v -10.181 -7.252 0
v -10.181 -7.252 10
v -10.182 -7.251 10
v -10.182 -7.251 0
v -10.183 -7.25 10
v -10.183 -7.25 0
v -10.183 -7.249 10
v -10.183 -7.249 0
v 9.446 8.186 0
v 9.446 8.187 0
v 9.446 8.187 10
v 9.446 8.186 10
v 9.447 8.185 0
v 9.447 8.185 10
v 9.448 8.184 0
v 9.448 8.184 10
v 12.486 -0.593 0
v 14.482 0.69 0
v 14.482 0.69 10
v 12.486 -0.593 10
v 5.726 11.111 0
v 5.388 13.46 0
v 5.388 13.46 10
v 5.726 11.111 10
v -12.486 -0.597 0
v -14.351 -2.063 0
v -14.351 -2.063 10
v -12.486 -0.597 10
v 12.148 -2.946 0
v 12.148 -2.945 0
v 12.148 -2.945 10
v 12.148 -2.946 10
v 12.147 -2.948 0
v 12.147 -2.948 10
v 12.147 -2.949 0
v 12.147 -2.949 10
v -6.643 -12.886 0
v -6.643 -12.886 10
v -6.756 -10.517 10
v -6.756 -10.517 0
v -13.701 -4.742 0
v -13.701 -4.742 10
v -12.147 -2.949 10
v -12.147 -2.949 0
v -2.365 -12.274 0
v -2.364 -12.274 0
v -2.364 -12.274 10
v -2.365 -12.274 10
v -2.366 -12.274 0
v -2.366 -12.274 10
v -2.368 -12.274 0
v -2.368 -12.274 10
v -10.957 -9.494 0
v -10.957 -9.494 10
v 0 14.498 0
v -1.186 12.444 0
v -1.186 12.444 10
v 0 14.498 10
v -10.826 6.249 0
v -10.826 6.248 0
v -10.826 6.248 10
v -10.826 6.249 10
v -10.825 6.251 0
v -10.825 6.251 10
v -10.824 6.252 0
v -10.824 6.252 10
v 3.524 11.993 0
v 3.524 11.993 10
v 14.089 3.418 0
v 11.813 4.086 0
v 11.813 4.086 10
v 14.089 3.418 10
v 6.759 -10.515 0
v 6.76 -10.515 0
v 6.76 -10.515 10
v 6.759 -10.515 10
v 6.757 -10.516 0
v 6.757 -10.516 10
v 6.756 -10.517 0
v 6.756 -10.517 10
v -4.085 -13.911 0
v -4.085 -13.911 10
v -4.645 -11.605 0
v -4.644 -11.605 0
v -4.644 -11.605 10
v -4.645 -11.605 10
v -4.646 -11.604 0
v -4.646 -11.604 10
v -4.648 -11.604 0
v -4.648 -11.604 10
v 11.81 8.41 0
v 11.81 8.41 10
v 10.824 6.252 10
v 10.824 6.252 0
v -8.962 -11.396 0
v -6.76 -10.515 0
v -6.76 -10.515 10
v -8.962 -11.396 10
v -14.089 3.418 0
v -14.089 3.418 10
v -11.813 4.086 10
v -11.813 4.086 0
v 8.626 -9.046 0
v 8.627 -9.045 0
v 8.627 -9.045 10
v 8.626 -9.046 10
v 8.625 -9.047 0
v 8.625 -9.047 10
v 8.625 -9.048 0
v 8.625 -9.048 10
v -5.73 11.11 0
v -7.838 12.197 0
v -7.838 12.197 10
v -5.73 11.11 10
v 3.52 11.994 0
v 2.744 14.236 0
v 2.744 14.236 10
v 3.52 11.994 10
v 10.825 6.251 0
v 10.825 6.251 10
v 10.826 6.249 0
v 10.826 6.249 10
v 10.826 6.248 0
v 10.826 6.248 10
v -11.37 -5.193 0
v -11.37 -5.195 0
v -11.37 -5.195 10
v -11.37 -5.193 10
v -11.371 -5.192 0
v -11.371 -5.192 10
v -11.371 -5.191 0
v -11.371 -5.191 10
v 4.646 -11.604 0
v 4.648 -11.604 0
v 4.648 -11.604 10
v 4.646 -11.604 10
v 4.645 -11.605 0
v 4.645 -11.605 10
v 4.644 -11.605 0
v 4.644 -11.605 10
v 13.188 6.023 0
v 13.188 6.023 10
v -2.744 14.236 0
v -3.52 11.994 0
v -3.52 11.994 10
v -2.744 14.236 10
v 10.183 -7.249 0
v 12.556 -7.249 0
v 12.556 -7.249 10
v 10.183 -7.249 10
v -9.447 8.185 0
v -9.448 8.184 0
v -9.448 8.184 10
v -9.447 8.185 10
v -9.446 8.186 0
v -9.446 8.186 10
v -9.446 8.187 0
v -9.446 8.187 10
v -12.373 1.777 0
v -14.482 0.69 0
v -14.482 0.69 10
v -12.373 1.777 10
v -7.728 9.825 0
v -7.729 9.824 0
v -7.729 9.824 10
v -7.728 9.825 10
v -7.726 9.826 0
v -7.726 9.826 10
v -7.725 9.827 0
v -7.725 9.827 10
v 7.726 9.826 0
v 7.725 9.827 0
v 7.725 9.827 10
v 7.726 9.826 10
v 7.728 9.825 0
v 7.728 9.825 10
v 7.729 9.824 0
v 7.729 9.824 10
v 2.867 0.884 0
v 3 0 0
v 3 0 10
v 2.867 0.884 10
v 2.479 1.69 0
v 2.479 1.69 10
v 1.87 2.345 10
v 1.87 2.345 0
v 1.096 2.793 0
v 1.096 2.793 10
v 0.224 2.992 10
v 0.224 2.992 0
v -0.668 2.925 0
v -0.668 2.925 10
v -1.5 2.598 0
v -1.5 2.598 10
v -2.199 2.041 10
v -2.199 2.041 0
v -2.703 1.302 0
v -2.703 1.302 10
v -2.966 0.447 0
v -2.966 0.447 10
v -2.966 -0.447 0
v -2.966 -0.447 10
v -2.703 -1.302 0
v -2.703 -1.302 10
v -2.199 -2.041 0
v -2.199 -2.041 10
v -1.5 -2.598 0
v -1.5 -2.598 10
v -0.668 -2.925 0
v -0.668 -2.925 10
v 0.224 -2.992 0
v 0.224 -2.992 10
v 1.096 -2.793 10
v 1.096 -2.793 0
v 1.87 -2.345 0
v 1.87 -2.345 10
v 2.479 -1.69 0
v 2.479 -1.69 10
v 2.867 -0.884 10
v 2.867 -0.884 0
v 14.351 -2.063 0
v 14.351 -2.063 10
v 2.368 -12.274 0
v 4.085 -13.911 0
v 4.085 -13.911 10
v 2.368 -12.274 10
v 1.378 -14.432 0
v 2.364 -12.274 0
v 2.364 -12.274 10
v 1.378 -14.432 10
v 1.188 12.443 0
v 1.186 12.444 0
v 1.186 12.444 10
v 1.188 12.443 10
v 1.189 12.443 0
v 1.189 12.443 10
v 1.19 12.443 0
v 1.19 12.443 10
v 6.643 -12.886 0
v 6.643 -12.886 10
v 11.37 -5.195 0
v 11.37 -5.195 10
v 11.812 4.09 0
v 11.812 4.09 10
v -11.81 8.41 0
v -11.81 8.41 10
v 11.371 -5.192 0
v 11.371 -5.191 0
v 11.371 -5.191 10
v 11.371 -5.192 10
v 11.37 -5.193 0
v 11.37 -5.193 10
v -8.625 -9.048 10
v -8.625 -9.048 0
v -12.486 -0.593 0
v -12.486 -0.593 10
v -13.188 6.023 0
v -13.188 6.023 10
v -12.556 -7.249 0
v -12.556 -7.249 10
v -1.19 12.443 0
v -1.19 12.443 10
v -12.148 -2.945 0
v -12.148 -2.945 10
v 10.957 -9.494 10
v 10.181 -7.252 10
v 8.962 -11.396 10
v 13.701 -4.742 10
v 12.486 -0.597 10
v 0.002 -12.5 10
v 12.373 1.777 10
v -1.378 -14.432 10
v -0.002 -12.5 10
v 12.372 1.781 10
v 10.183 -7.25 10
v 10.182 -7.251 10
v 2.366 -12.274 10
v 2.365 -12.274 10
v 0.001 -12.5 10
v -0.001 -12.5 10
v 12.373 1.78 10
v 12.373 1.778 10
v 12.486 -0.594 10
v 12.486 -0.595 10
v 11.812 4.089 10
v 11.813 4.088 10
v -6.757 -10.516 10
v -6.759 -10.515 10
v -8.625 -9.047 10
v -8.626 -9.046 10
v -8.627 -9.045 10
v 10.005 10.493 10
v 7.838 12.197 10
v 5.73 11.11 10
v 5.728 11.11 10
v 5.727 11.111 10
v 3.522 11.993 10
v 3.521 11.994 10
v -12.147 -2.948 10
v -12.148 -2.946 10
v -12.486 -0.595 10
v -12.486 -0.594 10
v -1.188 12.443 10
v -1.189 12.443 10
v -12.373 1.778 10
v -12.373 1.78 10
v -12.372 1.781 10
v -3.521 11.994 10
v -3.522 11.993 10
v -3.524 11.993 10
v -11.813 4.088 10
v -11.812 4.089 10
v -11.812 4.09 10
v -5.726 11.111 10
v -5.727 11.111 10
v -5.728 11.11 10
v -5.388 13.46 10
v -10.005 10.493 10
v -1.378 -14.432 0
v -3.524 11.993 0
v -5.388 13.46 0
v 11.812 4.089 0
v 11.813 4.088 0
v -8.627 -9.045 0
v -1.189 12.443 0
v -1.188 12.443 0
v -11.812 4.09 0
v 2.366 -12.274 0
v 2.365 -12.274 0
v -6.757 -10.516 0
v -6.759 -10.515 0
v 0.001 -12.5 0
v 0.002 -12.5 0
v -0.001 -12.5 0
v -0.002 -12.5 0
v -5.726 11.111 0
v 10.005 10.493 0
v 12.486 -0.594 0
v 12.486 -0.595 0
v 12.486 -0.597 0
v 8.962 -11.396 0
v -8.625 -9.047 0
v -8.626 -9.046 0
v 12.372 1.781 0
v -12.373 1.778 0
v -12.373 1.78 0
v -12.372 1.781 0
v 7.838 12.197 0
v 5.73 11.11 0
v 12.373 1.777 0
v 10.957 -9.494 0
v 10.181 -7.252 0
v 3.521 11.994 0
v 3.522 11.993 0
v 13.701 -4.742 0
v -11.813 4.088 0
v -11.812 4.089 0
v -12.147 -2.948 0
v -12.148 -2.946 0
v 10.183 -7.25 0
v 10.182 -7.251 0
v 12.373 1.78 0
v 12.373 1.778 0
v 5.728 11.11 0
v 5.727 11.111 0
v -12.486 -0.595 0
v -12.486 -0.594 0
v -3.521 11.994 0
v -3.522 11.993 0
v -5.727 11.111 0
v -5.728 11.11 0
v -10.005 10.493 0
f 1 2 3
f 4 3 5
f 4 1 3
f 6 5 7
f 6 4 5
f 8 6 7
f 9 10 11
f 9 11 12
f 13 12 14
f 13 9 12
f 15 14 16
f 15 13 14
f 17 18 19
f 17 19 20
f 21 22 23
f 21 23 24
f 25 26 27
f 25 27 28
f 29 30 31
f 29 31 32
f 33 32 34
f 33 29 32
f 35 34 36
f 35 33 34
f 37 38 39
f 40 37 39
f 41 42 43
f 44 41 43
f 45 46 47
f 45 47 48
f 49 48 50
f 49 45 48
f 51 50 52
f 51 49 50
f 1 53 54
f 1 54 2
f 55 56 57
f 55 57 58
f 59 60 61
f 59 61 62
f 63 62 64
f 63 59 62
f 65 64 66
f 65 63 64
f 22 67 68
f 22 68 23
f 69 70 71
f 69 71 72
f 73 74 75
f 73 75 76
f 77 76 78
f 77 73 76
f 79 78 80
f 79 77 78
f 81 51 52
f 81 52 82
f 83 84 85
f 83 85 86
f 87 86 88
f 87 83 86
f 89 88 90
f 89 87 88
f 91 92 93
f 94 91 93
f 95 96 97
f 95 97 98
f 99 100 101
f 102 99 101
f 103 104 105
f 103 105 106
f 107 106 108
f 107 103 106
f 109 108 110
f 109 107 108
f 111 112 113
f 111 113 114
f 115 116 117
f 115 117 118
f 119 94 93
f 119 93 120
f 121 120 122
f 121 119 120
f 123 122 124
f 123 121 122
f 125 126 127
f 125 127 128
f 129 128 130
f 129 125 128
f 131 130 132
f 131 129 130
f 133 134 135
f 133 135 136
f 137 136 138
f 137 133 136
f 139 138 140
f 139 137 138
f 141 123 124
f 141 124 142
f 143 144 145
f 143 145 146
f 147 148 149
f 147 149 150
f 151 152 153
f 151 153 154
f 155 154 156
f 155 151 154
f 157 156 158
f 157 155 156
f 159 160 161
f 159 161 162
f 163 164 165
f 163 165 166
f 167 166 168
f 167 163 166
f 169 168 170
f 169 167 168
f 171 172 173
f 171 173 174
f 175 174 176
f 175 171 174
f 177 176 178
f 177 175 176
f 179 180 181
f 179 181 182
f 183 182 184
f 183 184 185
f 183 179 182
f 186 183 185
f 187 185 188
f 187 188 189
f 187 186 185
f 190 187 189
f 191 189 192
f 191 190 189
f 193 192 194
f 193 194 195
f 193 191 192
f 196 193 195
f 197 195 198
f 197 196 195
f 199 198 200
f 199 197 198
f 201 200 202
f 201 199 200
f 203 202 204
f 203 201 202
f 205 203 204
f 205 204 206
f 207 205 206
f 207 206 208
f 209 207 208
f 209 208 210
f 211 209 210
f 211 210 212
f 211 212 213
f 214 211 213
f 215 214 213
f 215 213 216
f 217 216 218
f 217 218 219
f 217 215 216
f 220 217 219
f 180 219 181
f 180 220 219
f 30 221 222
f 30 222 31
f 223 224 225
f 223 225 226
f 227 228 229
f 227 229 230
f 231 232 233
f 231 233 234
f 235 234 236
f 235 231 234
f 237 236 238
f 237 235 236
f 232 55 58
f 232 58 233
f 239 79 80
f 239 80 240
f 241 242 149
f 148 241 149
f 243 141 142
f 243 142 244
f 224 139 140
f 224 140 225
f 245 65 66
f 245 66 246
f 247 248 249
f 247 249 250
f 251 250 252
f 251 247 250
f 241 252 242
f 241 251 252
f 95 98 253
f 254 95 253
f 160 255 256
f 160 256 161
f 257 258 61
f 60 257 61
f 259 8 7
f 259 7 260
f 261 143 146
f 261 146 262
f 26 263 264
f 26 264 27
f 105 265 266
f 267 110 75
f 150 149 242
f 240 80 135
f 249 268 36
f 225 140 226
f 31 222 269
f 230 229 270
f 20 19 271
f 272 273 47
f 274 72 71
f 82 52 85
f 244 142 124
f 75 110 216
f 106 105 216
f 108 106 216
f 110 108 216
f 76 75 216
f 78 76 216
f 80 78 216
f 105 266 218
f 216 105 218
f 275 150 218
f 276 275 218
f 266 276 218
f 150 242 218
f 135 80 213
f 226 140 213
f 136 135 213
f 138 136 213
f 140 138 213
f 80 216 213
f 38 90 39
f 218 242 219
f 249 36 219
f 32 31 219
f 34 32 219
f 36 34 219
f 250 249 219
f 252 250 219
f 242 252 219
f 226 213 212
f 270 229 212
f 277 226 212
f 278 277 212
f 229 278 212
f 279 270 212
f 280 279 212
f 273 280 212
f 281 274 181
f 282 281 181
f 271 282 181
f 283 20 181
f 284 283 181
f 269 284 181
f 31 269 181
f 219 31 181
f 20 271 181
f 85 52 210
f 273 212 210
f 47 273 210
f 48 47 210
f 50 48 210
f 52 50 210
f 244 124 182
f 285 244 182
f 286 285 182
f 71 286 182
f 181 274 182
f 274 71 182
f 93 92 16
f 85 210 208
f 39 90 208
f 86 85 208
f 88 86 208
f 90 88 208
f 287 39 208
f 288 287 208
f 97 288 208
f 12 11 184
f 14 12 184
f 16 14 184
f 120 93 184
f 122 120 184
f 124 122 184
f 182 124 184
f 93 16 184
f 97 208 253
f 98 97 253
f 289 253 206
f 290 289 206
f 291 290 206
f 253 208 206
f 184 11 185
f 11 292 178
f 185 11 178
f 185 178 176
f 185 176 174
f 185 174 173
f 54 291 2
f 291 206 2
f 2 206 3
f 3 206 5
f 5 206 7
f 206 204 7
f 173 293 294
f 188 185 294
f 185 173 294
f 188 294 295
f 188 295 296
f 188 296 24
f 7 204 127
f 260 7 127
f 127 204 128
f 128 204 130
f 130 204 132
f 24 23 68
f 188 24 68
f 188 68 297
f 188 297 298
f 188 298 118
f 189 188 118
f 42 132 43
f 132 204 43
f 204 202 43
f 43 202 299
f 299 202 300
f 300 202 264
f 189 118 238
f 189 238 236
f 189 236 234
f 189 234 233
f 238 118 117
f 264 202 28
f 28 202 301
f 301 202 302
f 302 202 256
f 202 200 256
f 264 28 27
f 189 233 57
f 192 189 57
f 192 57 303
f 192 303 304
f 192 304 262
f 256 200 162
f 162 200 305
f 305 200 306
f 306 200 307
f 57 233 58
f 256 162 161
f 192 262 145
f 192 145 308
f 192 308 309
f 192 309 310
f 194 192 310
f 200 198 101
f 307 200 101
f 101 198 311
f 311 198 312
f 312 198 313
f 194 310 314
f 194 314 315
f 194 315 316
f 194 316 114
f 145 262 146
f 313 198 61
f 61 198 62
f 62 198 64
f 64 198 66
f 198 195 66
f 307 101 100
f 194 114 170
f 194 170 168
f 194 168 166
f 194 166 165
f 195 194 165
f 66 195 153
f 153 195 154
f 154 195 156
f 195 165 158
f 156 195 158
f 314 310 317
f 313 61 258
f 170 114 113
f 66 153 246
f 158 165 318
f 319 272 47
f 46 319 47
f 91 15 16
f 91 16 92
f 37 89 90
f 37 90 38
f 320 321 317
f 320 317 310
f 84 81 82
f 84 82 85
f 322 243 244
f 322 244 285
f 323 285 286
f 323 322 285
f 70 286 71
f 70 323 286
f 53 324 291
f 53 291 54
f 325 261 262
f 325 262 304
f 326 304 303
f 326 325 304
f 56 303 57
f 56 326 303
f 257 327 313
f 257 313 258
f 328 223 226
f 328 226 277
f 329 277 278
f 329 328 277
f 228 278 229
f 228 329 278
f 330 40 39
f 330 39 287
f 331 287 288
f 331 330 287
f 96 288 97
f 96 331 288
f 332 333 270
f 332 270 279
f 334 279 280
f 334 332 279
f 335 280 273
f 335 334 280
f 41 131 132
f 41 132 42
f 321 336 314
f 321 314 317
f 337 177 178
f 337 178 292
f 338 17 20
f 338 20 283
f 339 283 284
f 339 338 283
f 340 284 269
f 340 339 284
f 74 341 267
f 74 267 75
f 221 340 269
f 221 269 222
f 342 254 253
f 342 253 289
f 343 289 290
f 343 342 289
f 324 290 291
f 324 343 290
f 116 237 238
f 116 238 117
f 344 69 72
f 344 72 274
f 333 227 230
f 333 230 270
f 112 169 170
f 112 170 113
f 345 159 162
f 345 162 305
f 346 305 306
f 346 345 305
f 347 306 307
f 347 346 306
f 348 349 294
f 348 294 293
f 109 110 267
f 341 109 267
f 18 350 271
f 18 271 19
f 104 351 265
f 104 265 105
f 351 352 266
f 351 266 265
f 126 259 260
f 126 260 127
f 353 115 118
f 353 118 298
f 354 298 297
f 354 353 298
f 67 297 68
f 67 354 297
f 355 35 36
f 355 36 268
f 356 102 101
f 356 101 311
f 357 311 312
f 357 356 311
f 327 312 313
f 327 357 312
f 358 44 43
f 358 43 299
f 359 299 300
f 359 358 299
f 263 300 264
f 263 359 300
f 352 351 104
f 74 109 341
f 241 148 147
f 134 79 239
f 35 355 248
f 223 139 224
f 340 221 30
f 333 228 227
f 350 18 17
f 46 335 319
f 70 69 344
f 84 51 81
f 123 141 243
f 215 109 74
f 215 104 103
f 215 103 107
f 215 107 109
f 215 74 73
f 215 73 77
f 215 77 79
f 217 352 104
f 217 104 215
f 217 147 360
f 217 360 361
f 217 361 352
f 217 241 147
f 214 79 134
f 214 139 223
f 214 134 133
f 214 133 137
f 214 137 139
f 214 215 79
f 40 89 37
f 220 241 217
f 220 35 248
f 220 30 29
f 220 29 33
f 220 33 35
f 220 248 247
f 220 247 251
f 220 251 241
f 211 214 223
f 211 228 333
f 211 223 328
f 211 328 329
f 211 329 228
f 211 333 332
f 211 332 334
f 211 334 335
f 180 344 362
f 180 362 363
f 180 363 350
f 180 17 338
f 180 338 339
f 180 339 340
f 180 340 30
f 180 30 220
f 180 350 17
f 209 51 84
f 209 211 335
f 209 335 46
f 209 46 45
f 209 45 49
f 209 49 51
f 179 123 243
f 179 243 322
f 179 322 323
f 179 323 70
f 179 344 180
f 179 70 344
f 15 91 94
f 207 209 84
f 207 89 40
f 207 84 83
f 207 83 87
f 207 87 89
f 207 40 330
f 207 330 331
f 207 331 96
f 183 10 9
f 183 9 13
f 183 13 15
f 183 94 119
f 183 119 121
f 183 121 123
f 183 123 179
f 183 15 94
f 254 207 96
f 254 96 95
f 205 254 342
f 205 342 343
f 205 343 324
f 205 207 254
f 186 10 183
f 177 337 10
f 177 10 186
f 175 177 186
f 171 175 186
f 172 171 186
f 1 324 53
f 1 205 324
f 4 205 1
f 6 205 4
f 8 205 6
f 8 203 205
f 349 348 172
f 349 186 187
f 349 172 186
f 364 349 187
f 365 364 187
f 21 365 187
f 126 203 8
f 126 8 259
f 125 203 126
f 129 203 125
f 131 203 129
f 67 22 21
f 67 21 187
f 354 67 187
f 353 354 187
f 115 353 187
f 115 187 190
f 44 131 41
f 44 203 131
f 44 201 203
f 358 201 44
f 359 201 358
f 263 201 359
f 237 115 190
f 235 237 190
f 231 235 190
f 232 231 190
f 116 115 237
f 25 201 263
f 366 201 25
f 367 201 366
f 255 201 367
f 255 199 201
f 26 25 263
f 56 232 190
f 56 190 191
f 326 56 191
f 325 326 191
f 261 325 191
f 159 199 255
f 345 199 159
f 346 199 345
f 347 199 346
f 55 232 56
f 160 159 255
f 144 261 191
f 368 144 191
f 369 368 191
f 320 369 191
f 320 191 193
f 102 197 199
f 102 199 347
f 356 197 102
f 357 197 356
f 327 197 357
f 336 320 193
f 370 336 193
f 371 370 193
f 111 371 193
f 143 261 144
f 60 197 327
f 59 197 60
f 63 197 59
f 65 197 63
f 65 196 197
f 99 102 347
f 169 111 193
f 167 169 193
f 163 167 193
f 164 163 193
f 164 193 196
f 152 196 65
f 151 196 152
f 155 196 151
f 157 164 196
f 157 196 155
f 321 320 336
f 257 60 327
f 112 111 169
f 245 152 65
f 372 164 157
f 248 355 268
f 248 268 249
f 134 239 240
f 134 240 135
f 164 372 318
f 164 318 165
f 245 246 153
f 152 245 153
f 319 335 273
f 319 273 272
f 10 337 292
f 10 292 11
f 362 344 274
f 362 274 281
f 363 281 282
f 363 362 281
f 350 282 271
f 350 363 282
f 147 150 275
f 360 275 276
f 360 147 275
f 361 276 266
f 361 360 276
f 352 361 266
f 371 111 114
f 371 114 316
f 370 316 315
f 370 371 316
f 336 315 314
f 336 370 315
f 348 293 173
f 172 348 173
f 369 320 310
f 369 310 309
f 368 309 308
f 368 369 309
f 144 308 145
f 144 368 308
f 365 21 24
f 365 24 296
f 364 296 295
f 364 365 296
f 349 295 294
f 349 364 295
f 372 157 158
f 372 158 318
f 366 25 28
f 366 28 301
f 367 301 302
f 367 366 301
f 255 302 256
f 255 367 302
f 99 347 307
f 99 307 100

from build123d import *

# Parameters (mm, degrees)
SKETCH1_R           = 3
BOSS_EXTRUDE1_DEPTH = 10


with BuildPart() as part:
    # Sketch1 → Boss-Extrude1 (new body)
    with BuildSketch(Plane.XY):
        with BuildLine():
            Line((0, 14.498076211), (1.186155793, 12.443594112))
            ThreePointArc((1.186155793, 12.443594112), (1.188200541, 12.443399032), (1.190245258, 12.443203616))
            Line((1.190245258, 12.443203616), (2.743778964, 14.236077087))
            Line((2.743778964, 14.236077087), (3.519686083, 11.994240696))
            ThreePointArc((3.519686083, 11.994240696), (3.521656961, 11.99366217), (3.523627743, 11.99308332))
            Line((3.523627743, 11.99308332), (5.388390607, 13.459549045))
            Line((5.388390607, 13.459549045), (5.726005747, 11.111384171))
            ThreePointArc((5.726005747, 11.111384171), (5.727831522, 11.110443108), (5.729657142, 11.109501746))
            Line((5.729657142, 11.109501746), (7.838251774, 12.196557832))
            Line((7.838251774, 12.196557832), (7.725372644, 9.826933271))
            ThreePointArc((7.725372644, 9.826933271), (7.726987328, 9.825663684), (7.728601803, 9.824393833))
            Line((7.728601803, 9.824393833), (10.0048181, 10.492751241))
            Line((10.0048181, 10.492751241), (9.445524446, 8.187311399))
            ThreePointArc((9.445524446, 8.187311399), (9.446869679, 8.185759174), (9.448214658, 8.184206729))
            Line((9.448214658, 8.184206729), (11.809784233, 8.409709282))
            Line((11.809784233, 8.409709282), (10.824290385, 6.251778761))
            ThreePointArc((10.824290385, 6.251778761), (10.825317547, 6.25), (10.826344418, 6.248221071))
            Line((10.826344418, 6.248221071), (13.187913993, 6.022718518))
            Line((13.187913993, 6.022718518), (11.811838266, 4.090290549))
            ThreePointArc((11.811838266, 4.090290549), (11.812510234, 4.088349541), (11.813181883, 4.086408423))
            Line((11.813181883, 4.086408423), (14.089398181, 3.418051015))
            Line((14.089398181, 3.418051015), (12.372475537, 1.780968581))
            ThreePointArc((12.372475537, 1.780968581), (12.372768024, 1.778935478), (12.373060176, 1.776902328))
            Line((12.373060176, 1.776902328), (14.481654809, 0.689846242))
            Line((14.481654809, 0.689846242), (12.485939306, -0.592722233))
            ThreePointArc((12.485939306, -0.592722233), (12.48584174, -0.594773948), (12.485743836, -0.596825646))
            Line((12.485743836, -0.596825646), (14.3505067, -2.063291371))
            Line((14.3505067, -2.063291371), (12.148128697, -2.944990521))
            ThreePointArc((12.148128697, -2.944990521), (12.147644604, -2.946986694), (12.147160183, -2.948982787))
            Line((12.147160183, -2.948982787), (13.70069389, -4.741856258))
            Line((13.70069389, -4.741856258), (11.371253065, -5.190819178))
            ThreePointArc((11.371253065, -5.190819178), (11.370399942, -5.192687663), (11.369546512, -5.194556007))
            Line((11.369546512, -5.194556007), (12.555702305, -7.249038106))
            Line((12.555702305, -7.249038106), (10.183390719, -7.249038106))
            ThreePointArc((10.183390719, -7.249038106), (10.182199401, -7.25071137), (10.181007807, -7.252384438))
            Line((10.181007807, -7.252384438), (10.956914926, -9.494220829))
            Line((10.956914926, -9.494220829), (8.627474101, -9.045257909))
            ThreePointArc((8.627474101, -9.045257909), (8.625987644, -9.046675476), (8.624500953, -9.048092799))
            Line((8.624500953, -9.048092799), (8.962116093, -11.396257674))
            Line((8.962116093, -11.396257674), (6.75973809, -10.514558524))
            ThreePointArc((6.75973809, -10.514558524), (6.758010218, -10.51566916), (6.756282164, -10.516779513))
            Line((6.756282164, -10.516779513), (6.643403034, -12.886404074))
            Line((6.643403034, -12.886404074), (4.647687532, -11.603835599))
            ThreePointArc((4.647687532, -11.603835599), (4.645780696, -11.604599163), (4.643873734, -11.605362413))
            Line((4.643873734, -11.605362413), (4.08458008, -13.910802256))
            Line((4.08458008, -13.910802256), (2.367657437, -12.273719822))
            ThreePointArc((2.367657437, -12.273719822), (2.365640555, -12.274108716), (2.363623608, -12.274497278))
            Line((2.363623608, -12.274497278), (1.37812976, -14.4324278))
            Line((1.37812976, -14.4324278), (0.002054033, -12.499999831))
            ThreePointArc((0.002054033, -12.499999831), (0, -12.5), (-0.002054033, -12.499999831))
            Line((-0.002054033, -12.499999831), (-1.37812976, -14.4324278))
            Line((-1.37812976, -14.4324278), (-2.363623608, -12.274497278))
            ThreePointArc((-2.363623608, -12.274497278), (-2.365640555, -12.274108716), (-2.367657437, -12.273719822))
            Line((-2.367657437, -12.273719822), (-4.08458008, -13.910802256))
            Line((-4.08458008, -13.910802256), (-4.643873734, -11.605362413))
            ThreePointArc((-4.643873734, -11.605362413), (-4.645780696, -11.604599163), (-4.647687532, -11.603835599))
            Line((-4.647687532, -11.603835599), (-6.643403034, -12.886404074))
            Line((-6.643403034, -12.886404074), (-6.756282164, -10.516779513))
            ThreePointArc((-6.756282164, -10.516779513), (-6.758010218, -10.51566916), (-6.75973809, -10.514558524))
            Line((-6.75973809, -10.514558524), (-8.962116093, -11.396257674))
            Line((-8.962116093, -11.396257674), (-8.624500953, -9.048092799))
            ThreePointArc((-8.624500953, -9.048092799), (-8.625987644, -9.046675476), (-8.627474101, -9.045257909))
            Line((-8.627474101, -9.045257909), (-10.956914926, -9.494220829))
            Line((-10.956914926, -9.494220829), (-10.181007807, -7.252384438))
            ThreePointArc((-10.181007807, -7.252384438), (-10.182199401, -7.25071137), (-10.183390719, -7.249038106))
            Line((-10.183390719, -7.249038106), (-12.555702305, -7.249038106))
            Line((-12.555702305, -7.249038106), (-11.369546512, -5.194556007))
            ThreePointArc((-11.369546512, -5.194556007), (-11.370399942, -5.192687663), (-11.371253065, -5.190819178))
            Line((-11.371253065, -5.190819178), (-13.70069389, -4.741856258))
            Line((-13.70069389, -4.741856258), (-12.147160183, -2.948982787))
            ThreePointArc((-12.147160183, -2.948982787), (-12.147644604, -2.946986694), (-12.148128697, -2.944990521))
            Line((-12.148128697, -2.944990521), (-14.3505067, -2.063291371))
            Line((-14.3505067, -2.063291371), (-12.485743836, -0.596825646))
            ThreePointArc((-12.485743836, -0.596825646), (-12.48584174, -0.594773948), (-12.485939306, -0.592722233))
            Line((-12.485939306, -0.592722233), (-14.481654809, 0.689846242))
            Line((-14.481654809, 0.689846242), (-12.373060176, 1.776902328))
            ThreePointArc((-12.373060176, 1.776902328), (-12.372768024, 1.778935478), (-12.372475537, 1.780968581))
            Line((-12.372475537, 1.780968581), (-14.089398181, 3.418051015))
            Line((-14.089398181, 3.418051015), (-11.813181883, 4.086408423))
            ThreePointArc((-11.813181883, 4.086408423), (-11.812510234, 4.088349541), (-11.811838266, 4.090290549))
            Line((-11.811838266, 4.090290549), (-13.187913993, 6.022718518))
            Line((-13.187913993, 6.022718518), (-10.826344418, 6.248221071))
            ThreePointArc((-10.826344418, 6.248221071), (-10.825317547, 6.25), (-10.824290385, 6.251778761))
            Line((-10.824290385, 6.251778761), (-11.809784233, 8.409709282))
            Line((-11.809784233, 8.409709282), (-9.448214658, 8.184206729))
            ThreePointArc((-9.448214658, 8.184206729), (-9.446869679, 8.185759174), (-9.445524446, 8.187311399))
            Line((-9.445524446, 8.187311399), (-10.0048181, 10.492751241))
            Line((-10.0048181, 10.492751241), (-7.728601803, 9.824393833))
            ThreePointArc((-7.728601803, 9.824393833), (-7.726987328, 9.825663684), (-7.725372644, 9.826933271))
            Line((-7.725372644, 9.826933271), (-7.838251774, 12.196557832))
            Line((-7.838251774, 12.196557832), (-5.729657142, 11.109501746))
            ThreePointArc((-5.729657142, 11.109501746), (-5.727831522, 11.110443108), (-5.726005747, 11.111384171))
            Line((-5.726005747, 11.111384171), (-5.388390607, 13.459549045))
            Line((-5.388390607, 13.459549045), (-3.523627743, 11.99308332))
            ThreePointArc((-3.523627743, 11.99308332), (-3.521656961, 11.99366217), (-3.519686083, 11.994240696))
            Line((-3.519686083, 11.994240696), (-2.743778964, 14.236077087))
            Line((-2.743778964, 14.236077087), (-1.190245258, 12.443203616))
            ThreePointArc((-1.190245258, 12.443203616), (-1.188200541, 12.443399032), (-1.186155793, 12.443594112))
            Line((-1.186155793, 12.443594112), (0, 14.498076211))
        make_face()
        Circle(SKETCH1_R, mode=Mode.SUBTRACT)
    extrude(amount=BOSS_EXTRUDE1_DEPTH)


solid = part.part
